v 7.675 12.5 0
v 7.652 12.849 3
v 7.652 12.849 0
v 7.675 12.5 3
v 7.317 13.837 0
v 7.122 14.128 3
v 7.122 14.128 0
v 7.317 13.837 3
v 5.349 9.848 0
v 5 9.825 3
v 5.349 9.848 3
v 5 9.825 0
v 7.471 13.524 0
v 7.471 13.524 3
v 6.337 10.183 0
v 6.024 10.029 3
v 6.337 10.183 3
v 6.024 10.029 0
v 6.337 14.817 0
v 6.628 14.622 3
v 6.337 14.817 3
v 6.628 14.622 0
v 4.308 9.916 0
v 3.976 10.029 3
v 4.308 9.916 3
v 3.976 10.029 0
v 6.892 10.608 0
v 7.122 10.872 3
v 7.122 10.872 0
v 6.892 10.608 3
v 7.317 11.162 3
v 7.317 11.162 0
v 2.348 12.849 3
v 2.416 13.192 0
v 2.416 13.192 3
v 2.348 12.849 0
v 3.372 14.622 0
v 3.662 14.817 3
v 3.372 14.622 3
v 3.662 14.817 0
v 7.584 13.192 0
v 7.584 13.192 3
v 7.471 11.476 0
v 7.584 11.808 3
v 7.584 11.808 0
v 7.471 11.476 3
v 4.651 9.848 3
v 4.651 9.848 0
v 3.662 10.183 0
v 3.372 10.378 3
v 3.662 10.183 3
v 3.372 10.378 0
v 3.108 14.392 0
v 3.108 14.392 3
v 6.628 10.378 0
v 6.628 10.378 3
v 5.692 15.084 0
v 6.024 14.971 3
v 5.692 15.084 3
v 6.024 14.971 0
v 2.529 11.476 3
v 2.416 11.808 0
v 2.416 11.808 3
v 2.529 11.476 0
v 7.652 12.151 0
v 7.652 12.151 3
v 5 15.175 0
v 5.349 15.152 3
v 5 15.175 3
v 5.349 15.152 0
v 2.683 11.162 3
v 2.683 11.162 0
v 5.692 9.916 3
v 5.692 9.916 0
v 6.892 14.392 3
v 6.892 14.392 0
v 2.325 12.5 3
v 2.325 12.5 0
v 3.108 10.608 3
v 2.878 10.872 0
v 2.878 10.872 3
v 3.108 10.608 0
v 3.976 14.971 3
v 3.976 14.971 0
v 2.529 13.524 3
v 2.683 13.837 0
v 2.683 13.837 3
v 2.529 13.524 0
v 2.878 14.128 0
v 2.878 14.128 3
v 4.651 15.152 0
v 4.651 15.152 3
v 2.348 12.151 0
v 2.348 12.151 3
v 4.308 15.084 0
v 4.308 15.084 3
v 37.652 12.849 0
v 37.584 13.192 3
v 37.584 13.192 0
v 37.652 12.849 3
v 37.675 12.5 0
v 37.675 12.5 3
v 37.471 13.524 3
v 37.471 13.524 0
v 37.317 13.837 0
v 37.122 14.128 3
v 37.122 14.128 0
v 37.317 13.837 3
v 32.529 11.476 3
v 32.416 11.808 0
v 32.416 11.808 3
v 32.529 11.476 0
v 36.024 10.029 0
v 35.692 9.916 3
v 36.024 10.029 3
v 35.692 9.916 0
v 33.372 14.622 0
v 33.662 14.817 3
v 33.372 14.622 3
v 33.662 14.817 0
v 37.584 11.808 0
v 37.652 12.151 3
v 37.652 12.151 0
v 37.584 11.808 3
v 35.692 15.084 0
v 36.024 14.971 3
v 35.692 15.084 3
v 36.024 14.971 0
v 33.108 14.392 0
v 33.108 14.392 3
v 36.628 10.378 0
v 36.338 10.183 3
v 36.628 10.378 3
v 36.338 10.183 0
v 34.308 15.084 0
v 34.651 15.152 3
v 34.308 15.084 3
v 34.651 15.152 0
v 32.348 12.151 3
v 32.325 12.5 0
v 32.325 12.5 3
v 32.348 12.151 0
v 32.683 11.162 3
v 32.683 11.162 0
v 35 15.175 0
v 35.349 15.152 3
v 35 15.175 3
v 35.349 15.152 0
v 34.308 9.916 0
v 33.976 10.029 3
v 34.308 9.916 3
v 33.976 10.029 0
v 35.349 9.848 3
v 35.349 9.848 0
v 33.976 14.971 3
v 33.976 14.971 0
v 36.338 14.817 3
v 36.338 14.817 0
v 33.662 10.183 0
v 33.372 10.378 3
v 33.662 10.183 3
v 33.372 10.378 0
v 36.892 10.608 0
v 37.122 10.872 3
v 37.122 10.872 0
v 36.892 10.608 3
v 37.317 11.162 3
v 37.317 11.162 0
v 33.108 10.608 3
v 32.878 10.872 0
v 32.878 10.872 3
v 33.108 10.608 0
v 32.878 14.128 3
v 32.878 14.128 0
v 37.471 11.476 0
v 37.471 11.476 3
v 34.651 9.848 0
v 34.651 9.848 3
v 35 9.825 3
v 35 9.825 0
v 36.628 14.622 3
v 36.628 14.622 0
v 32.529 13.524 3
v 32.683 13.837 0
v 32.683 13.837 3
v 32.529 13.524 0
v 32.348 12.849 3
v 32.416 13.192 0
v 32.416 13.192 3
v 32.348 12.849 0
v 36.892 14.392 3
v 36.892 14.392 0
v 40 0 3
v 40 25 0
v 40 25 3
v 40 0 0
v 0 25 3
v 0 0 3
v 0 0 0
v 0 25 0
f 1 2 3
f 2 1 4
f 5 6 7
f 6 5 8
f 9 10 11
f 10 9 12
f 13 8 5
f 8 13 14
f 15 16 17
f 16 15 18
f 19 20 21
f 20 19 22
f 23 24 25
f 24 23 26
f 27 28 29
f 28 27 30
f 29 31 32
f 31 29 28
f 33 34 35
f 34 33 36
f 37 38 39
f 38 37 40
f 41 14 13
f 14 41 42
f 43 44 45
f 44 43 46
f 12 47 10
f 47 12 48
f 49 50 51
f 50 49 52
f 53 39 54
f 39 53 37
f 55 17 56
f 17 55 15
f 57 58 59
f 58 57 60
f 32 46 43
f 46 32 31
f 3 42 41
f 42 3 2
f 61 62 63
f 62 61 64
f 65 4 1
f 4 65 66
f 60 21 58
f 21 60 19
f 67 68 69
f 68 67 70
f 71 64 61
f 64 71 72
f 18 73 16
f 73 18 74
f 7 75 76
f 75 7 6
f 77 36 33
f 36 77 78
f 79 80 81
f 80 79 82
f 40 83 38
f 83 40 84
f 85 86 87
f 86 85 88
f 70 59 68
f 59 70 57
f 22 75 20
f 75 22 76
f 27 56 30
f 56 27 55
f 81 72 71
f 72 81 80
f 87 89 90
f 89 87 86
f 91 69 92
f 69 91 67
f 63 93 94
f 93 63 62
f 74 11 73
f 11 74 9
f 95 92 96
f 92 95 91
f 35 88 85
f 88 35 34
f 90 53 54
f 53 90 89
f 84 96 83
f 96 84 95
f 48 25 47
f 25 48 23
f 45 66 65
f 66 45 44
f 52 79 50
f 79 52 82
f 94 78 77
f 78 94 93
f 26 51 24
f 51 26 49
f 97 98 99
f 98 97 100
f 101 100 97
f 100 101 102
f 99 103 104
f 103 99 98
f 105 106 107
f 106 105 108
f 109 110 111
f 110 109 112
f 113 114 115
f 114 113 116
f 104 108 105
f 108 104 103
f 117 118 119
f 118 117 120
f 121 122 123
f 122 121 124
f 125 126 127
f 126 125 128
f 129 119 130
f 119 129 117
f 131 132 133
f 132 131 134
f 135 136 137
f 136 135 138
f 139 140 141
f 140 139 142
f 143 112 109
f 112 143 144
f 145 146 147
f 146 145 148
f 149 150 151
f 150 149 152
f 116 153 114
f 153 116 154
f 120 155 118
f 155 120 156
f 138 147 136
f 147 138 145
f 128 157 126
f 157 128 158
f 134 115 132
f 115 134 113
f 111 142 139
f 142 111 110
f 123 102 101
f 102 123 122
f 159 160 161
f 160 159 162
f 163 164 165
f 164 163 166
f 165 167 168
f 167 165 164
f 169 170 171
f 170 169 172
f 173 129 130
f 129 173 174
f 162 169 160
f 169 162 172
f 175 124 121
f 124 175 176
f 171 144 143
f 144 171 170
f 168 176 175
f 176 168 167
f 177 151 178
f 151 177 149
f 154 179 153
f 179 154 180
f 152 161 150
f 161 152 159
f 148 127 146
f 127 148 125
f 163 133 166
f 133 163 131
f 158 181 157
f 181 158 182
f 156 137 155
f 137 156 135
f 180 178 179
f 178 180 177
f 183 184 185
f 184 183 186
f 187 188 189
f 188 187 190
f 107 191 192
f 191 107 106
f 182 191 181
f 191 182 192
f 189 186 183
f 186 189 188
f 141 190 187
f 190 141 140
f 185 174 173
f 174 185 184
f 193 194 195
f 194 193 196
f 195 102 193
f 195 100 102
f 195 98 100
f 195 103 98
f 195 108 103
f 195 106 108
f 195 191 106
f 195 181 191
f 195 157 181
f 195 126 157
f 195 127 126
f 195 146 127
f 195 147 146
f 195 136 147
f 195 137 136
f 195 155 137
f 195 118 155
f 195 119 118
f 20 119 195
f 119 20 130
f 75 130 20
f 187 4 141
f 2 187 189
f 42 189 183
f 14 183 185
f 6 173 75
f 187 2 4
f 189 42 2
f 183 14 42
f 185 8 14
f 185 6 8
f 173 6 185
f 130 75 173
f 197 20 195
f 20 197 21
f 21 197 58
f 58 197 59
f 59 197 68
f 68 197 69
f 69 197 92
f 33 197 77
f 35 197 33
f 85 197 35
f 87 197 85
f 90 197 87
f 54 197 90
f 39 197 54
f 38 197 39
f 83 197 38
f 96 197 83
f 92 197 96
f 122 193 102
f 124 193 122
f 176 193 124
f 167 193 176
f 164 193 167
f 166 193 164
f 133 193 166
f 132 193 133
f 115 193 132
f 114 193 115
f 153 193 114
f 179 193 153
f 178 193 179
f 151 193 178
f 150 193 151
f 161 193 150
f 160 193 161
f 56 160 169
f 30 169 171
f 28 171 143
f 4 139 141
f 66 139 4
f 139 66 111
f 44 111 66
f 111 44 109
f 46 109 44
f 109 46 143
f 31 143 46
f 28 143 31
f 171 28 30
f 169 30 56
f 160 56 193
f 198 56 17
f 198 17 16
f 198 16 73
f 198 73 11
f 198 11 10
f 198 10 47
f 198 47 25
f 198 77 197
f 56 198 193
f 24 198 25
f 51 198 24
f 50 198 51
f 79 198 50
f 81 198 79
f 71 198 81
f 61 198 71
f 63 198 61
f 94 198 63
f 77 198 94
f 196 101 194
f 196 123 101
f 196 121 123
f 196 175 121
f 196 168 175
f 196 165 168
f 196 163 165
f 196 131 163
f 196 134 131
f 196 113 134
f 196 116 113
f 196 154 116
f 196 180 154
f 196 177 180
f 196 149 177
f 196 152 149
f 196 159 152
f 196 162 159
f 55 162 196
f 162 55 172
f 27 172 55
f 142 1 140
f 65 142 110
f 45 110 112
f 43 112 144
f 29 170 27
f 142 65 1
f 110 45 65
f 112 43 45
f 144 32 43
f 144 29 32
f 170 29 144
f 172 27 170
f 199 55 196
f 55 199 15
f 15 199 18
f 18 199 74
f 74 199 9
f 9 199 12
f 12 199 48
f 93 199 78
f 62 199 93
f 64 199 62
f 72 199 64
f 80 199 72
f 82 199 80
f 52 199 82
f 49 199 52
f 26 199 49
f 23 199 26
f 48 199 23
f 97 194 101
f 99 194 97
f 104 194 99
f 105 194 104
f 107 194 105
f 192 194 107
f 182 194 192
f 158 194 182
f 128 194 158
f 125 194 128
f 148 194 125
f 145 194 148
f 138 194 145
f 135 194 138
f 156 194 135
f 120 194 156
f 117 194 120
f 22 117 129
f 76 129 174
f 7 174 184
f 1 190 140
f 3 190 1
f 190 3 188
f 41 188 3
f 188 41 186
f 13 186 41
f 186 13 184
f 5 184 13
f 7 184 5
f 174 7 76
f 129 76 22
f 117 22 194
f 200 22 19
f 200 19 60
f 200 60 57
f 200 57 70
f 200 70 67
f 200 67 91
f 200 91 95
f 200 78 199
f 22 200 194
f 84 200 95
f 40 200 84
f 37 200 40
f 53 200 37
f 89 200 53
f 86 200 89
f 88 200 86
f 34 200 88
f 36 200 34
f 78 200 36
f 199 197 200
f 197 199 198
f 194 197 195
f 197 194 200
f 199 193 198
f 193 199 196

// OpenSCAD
// A part reverse-engineered for CAD: every number is a measurement, named at the top, so a re-measure is one edit.
// Render: openscad -o bracket.stl [-D 'w=42'] bracket.scad   (checked with OpenSCAD on 2026-11-14)
w = 40; d = 25; t = 3;      // plate, mm, measured with calipers
hole_d = 5.2; hole_dx = 30; // 5 mm screw + 0.2 clearance, centres 30 apart
fit = 0.15;                 // printer tolerance, from a test print (hardware.md, fit)
difference() {
	cube([w, d, t]);
	for (x = [(w - hole_dx) / 2, (w + hole_dx) / 2])
		translate([x, d / 2, -1]) cylinder(d = hole_d + fit, h = t + 2, $fn = 48);
}
